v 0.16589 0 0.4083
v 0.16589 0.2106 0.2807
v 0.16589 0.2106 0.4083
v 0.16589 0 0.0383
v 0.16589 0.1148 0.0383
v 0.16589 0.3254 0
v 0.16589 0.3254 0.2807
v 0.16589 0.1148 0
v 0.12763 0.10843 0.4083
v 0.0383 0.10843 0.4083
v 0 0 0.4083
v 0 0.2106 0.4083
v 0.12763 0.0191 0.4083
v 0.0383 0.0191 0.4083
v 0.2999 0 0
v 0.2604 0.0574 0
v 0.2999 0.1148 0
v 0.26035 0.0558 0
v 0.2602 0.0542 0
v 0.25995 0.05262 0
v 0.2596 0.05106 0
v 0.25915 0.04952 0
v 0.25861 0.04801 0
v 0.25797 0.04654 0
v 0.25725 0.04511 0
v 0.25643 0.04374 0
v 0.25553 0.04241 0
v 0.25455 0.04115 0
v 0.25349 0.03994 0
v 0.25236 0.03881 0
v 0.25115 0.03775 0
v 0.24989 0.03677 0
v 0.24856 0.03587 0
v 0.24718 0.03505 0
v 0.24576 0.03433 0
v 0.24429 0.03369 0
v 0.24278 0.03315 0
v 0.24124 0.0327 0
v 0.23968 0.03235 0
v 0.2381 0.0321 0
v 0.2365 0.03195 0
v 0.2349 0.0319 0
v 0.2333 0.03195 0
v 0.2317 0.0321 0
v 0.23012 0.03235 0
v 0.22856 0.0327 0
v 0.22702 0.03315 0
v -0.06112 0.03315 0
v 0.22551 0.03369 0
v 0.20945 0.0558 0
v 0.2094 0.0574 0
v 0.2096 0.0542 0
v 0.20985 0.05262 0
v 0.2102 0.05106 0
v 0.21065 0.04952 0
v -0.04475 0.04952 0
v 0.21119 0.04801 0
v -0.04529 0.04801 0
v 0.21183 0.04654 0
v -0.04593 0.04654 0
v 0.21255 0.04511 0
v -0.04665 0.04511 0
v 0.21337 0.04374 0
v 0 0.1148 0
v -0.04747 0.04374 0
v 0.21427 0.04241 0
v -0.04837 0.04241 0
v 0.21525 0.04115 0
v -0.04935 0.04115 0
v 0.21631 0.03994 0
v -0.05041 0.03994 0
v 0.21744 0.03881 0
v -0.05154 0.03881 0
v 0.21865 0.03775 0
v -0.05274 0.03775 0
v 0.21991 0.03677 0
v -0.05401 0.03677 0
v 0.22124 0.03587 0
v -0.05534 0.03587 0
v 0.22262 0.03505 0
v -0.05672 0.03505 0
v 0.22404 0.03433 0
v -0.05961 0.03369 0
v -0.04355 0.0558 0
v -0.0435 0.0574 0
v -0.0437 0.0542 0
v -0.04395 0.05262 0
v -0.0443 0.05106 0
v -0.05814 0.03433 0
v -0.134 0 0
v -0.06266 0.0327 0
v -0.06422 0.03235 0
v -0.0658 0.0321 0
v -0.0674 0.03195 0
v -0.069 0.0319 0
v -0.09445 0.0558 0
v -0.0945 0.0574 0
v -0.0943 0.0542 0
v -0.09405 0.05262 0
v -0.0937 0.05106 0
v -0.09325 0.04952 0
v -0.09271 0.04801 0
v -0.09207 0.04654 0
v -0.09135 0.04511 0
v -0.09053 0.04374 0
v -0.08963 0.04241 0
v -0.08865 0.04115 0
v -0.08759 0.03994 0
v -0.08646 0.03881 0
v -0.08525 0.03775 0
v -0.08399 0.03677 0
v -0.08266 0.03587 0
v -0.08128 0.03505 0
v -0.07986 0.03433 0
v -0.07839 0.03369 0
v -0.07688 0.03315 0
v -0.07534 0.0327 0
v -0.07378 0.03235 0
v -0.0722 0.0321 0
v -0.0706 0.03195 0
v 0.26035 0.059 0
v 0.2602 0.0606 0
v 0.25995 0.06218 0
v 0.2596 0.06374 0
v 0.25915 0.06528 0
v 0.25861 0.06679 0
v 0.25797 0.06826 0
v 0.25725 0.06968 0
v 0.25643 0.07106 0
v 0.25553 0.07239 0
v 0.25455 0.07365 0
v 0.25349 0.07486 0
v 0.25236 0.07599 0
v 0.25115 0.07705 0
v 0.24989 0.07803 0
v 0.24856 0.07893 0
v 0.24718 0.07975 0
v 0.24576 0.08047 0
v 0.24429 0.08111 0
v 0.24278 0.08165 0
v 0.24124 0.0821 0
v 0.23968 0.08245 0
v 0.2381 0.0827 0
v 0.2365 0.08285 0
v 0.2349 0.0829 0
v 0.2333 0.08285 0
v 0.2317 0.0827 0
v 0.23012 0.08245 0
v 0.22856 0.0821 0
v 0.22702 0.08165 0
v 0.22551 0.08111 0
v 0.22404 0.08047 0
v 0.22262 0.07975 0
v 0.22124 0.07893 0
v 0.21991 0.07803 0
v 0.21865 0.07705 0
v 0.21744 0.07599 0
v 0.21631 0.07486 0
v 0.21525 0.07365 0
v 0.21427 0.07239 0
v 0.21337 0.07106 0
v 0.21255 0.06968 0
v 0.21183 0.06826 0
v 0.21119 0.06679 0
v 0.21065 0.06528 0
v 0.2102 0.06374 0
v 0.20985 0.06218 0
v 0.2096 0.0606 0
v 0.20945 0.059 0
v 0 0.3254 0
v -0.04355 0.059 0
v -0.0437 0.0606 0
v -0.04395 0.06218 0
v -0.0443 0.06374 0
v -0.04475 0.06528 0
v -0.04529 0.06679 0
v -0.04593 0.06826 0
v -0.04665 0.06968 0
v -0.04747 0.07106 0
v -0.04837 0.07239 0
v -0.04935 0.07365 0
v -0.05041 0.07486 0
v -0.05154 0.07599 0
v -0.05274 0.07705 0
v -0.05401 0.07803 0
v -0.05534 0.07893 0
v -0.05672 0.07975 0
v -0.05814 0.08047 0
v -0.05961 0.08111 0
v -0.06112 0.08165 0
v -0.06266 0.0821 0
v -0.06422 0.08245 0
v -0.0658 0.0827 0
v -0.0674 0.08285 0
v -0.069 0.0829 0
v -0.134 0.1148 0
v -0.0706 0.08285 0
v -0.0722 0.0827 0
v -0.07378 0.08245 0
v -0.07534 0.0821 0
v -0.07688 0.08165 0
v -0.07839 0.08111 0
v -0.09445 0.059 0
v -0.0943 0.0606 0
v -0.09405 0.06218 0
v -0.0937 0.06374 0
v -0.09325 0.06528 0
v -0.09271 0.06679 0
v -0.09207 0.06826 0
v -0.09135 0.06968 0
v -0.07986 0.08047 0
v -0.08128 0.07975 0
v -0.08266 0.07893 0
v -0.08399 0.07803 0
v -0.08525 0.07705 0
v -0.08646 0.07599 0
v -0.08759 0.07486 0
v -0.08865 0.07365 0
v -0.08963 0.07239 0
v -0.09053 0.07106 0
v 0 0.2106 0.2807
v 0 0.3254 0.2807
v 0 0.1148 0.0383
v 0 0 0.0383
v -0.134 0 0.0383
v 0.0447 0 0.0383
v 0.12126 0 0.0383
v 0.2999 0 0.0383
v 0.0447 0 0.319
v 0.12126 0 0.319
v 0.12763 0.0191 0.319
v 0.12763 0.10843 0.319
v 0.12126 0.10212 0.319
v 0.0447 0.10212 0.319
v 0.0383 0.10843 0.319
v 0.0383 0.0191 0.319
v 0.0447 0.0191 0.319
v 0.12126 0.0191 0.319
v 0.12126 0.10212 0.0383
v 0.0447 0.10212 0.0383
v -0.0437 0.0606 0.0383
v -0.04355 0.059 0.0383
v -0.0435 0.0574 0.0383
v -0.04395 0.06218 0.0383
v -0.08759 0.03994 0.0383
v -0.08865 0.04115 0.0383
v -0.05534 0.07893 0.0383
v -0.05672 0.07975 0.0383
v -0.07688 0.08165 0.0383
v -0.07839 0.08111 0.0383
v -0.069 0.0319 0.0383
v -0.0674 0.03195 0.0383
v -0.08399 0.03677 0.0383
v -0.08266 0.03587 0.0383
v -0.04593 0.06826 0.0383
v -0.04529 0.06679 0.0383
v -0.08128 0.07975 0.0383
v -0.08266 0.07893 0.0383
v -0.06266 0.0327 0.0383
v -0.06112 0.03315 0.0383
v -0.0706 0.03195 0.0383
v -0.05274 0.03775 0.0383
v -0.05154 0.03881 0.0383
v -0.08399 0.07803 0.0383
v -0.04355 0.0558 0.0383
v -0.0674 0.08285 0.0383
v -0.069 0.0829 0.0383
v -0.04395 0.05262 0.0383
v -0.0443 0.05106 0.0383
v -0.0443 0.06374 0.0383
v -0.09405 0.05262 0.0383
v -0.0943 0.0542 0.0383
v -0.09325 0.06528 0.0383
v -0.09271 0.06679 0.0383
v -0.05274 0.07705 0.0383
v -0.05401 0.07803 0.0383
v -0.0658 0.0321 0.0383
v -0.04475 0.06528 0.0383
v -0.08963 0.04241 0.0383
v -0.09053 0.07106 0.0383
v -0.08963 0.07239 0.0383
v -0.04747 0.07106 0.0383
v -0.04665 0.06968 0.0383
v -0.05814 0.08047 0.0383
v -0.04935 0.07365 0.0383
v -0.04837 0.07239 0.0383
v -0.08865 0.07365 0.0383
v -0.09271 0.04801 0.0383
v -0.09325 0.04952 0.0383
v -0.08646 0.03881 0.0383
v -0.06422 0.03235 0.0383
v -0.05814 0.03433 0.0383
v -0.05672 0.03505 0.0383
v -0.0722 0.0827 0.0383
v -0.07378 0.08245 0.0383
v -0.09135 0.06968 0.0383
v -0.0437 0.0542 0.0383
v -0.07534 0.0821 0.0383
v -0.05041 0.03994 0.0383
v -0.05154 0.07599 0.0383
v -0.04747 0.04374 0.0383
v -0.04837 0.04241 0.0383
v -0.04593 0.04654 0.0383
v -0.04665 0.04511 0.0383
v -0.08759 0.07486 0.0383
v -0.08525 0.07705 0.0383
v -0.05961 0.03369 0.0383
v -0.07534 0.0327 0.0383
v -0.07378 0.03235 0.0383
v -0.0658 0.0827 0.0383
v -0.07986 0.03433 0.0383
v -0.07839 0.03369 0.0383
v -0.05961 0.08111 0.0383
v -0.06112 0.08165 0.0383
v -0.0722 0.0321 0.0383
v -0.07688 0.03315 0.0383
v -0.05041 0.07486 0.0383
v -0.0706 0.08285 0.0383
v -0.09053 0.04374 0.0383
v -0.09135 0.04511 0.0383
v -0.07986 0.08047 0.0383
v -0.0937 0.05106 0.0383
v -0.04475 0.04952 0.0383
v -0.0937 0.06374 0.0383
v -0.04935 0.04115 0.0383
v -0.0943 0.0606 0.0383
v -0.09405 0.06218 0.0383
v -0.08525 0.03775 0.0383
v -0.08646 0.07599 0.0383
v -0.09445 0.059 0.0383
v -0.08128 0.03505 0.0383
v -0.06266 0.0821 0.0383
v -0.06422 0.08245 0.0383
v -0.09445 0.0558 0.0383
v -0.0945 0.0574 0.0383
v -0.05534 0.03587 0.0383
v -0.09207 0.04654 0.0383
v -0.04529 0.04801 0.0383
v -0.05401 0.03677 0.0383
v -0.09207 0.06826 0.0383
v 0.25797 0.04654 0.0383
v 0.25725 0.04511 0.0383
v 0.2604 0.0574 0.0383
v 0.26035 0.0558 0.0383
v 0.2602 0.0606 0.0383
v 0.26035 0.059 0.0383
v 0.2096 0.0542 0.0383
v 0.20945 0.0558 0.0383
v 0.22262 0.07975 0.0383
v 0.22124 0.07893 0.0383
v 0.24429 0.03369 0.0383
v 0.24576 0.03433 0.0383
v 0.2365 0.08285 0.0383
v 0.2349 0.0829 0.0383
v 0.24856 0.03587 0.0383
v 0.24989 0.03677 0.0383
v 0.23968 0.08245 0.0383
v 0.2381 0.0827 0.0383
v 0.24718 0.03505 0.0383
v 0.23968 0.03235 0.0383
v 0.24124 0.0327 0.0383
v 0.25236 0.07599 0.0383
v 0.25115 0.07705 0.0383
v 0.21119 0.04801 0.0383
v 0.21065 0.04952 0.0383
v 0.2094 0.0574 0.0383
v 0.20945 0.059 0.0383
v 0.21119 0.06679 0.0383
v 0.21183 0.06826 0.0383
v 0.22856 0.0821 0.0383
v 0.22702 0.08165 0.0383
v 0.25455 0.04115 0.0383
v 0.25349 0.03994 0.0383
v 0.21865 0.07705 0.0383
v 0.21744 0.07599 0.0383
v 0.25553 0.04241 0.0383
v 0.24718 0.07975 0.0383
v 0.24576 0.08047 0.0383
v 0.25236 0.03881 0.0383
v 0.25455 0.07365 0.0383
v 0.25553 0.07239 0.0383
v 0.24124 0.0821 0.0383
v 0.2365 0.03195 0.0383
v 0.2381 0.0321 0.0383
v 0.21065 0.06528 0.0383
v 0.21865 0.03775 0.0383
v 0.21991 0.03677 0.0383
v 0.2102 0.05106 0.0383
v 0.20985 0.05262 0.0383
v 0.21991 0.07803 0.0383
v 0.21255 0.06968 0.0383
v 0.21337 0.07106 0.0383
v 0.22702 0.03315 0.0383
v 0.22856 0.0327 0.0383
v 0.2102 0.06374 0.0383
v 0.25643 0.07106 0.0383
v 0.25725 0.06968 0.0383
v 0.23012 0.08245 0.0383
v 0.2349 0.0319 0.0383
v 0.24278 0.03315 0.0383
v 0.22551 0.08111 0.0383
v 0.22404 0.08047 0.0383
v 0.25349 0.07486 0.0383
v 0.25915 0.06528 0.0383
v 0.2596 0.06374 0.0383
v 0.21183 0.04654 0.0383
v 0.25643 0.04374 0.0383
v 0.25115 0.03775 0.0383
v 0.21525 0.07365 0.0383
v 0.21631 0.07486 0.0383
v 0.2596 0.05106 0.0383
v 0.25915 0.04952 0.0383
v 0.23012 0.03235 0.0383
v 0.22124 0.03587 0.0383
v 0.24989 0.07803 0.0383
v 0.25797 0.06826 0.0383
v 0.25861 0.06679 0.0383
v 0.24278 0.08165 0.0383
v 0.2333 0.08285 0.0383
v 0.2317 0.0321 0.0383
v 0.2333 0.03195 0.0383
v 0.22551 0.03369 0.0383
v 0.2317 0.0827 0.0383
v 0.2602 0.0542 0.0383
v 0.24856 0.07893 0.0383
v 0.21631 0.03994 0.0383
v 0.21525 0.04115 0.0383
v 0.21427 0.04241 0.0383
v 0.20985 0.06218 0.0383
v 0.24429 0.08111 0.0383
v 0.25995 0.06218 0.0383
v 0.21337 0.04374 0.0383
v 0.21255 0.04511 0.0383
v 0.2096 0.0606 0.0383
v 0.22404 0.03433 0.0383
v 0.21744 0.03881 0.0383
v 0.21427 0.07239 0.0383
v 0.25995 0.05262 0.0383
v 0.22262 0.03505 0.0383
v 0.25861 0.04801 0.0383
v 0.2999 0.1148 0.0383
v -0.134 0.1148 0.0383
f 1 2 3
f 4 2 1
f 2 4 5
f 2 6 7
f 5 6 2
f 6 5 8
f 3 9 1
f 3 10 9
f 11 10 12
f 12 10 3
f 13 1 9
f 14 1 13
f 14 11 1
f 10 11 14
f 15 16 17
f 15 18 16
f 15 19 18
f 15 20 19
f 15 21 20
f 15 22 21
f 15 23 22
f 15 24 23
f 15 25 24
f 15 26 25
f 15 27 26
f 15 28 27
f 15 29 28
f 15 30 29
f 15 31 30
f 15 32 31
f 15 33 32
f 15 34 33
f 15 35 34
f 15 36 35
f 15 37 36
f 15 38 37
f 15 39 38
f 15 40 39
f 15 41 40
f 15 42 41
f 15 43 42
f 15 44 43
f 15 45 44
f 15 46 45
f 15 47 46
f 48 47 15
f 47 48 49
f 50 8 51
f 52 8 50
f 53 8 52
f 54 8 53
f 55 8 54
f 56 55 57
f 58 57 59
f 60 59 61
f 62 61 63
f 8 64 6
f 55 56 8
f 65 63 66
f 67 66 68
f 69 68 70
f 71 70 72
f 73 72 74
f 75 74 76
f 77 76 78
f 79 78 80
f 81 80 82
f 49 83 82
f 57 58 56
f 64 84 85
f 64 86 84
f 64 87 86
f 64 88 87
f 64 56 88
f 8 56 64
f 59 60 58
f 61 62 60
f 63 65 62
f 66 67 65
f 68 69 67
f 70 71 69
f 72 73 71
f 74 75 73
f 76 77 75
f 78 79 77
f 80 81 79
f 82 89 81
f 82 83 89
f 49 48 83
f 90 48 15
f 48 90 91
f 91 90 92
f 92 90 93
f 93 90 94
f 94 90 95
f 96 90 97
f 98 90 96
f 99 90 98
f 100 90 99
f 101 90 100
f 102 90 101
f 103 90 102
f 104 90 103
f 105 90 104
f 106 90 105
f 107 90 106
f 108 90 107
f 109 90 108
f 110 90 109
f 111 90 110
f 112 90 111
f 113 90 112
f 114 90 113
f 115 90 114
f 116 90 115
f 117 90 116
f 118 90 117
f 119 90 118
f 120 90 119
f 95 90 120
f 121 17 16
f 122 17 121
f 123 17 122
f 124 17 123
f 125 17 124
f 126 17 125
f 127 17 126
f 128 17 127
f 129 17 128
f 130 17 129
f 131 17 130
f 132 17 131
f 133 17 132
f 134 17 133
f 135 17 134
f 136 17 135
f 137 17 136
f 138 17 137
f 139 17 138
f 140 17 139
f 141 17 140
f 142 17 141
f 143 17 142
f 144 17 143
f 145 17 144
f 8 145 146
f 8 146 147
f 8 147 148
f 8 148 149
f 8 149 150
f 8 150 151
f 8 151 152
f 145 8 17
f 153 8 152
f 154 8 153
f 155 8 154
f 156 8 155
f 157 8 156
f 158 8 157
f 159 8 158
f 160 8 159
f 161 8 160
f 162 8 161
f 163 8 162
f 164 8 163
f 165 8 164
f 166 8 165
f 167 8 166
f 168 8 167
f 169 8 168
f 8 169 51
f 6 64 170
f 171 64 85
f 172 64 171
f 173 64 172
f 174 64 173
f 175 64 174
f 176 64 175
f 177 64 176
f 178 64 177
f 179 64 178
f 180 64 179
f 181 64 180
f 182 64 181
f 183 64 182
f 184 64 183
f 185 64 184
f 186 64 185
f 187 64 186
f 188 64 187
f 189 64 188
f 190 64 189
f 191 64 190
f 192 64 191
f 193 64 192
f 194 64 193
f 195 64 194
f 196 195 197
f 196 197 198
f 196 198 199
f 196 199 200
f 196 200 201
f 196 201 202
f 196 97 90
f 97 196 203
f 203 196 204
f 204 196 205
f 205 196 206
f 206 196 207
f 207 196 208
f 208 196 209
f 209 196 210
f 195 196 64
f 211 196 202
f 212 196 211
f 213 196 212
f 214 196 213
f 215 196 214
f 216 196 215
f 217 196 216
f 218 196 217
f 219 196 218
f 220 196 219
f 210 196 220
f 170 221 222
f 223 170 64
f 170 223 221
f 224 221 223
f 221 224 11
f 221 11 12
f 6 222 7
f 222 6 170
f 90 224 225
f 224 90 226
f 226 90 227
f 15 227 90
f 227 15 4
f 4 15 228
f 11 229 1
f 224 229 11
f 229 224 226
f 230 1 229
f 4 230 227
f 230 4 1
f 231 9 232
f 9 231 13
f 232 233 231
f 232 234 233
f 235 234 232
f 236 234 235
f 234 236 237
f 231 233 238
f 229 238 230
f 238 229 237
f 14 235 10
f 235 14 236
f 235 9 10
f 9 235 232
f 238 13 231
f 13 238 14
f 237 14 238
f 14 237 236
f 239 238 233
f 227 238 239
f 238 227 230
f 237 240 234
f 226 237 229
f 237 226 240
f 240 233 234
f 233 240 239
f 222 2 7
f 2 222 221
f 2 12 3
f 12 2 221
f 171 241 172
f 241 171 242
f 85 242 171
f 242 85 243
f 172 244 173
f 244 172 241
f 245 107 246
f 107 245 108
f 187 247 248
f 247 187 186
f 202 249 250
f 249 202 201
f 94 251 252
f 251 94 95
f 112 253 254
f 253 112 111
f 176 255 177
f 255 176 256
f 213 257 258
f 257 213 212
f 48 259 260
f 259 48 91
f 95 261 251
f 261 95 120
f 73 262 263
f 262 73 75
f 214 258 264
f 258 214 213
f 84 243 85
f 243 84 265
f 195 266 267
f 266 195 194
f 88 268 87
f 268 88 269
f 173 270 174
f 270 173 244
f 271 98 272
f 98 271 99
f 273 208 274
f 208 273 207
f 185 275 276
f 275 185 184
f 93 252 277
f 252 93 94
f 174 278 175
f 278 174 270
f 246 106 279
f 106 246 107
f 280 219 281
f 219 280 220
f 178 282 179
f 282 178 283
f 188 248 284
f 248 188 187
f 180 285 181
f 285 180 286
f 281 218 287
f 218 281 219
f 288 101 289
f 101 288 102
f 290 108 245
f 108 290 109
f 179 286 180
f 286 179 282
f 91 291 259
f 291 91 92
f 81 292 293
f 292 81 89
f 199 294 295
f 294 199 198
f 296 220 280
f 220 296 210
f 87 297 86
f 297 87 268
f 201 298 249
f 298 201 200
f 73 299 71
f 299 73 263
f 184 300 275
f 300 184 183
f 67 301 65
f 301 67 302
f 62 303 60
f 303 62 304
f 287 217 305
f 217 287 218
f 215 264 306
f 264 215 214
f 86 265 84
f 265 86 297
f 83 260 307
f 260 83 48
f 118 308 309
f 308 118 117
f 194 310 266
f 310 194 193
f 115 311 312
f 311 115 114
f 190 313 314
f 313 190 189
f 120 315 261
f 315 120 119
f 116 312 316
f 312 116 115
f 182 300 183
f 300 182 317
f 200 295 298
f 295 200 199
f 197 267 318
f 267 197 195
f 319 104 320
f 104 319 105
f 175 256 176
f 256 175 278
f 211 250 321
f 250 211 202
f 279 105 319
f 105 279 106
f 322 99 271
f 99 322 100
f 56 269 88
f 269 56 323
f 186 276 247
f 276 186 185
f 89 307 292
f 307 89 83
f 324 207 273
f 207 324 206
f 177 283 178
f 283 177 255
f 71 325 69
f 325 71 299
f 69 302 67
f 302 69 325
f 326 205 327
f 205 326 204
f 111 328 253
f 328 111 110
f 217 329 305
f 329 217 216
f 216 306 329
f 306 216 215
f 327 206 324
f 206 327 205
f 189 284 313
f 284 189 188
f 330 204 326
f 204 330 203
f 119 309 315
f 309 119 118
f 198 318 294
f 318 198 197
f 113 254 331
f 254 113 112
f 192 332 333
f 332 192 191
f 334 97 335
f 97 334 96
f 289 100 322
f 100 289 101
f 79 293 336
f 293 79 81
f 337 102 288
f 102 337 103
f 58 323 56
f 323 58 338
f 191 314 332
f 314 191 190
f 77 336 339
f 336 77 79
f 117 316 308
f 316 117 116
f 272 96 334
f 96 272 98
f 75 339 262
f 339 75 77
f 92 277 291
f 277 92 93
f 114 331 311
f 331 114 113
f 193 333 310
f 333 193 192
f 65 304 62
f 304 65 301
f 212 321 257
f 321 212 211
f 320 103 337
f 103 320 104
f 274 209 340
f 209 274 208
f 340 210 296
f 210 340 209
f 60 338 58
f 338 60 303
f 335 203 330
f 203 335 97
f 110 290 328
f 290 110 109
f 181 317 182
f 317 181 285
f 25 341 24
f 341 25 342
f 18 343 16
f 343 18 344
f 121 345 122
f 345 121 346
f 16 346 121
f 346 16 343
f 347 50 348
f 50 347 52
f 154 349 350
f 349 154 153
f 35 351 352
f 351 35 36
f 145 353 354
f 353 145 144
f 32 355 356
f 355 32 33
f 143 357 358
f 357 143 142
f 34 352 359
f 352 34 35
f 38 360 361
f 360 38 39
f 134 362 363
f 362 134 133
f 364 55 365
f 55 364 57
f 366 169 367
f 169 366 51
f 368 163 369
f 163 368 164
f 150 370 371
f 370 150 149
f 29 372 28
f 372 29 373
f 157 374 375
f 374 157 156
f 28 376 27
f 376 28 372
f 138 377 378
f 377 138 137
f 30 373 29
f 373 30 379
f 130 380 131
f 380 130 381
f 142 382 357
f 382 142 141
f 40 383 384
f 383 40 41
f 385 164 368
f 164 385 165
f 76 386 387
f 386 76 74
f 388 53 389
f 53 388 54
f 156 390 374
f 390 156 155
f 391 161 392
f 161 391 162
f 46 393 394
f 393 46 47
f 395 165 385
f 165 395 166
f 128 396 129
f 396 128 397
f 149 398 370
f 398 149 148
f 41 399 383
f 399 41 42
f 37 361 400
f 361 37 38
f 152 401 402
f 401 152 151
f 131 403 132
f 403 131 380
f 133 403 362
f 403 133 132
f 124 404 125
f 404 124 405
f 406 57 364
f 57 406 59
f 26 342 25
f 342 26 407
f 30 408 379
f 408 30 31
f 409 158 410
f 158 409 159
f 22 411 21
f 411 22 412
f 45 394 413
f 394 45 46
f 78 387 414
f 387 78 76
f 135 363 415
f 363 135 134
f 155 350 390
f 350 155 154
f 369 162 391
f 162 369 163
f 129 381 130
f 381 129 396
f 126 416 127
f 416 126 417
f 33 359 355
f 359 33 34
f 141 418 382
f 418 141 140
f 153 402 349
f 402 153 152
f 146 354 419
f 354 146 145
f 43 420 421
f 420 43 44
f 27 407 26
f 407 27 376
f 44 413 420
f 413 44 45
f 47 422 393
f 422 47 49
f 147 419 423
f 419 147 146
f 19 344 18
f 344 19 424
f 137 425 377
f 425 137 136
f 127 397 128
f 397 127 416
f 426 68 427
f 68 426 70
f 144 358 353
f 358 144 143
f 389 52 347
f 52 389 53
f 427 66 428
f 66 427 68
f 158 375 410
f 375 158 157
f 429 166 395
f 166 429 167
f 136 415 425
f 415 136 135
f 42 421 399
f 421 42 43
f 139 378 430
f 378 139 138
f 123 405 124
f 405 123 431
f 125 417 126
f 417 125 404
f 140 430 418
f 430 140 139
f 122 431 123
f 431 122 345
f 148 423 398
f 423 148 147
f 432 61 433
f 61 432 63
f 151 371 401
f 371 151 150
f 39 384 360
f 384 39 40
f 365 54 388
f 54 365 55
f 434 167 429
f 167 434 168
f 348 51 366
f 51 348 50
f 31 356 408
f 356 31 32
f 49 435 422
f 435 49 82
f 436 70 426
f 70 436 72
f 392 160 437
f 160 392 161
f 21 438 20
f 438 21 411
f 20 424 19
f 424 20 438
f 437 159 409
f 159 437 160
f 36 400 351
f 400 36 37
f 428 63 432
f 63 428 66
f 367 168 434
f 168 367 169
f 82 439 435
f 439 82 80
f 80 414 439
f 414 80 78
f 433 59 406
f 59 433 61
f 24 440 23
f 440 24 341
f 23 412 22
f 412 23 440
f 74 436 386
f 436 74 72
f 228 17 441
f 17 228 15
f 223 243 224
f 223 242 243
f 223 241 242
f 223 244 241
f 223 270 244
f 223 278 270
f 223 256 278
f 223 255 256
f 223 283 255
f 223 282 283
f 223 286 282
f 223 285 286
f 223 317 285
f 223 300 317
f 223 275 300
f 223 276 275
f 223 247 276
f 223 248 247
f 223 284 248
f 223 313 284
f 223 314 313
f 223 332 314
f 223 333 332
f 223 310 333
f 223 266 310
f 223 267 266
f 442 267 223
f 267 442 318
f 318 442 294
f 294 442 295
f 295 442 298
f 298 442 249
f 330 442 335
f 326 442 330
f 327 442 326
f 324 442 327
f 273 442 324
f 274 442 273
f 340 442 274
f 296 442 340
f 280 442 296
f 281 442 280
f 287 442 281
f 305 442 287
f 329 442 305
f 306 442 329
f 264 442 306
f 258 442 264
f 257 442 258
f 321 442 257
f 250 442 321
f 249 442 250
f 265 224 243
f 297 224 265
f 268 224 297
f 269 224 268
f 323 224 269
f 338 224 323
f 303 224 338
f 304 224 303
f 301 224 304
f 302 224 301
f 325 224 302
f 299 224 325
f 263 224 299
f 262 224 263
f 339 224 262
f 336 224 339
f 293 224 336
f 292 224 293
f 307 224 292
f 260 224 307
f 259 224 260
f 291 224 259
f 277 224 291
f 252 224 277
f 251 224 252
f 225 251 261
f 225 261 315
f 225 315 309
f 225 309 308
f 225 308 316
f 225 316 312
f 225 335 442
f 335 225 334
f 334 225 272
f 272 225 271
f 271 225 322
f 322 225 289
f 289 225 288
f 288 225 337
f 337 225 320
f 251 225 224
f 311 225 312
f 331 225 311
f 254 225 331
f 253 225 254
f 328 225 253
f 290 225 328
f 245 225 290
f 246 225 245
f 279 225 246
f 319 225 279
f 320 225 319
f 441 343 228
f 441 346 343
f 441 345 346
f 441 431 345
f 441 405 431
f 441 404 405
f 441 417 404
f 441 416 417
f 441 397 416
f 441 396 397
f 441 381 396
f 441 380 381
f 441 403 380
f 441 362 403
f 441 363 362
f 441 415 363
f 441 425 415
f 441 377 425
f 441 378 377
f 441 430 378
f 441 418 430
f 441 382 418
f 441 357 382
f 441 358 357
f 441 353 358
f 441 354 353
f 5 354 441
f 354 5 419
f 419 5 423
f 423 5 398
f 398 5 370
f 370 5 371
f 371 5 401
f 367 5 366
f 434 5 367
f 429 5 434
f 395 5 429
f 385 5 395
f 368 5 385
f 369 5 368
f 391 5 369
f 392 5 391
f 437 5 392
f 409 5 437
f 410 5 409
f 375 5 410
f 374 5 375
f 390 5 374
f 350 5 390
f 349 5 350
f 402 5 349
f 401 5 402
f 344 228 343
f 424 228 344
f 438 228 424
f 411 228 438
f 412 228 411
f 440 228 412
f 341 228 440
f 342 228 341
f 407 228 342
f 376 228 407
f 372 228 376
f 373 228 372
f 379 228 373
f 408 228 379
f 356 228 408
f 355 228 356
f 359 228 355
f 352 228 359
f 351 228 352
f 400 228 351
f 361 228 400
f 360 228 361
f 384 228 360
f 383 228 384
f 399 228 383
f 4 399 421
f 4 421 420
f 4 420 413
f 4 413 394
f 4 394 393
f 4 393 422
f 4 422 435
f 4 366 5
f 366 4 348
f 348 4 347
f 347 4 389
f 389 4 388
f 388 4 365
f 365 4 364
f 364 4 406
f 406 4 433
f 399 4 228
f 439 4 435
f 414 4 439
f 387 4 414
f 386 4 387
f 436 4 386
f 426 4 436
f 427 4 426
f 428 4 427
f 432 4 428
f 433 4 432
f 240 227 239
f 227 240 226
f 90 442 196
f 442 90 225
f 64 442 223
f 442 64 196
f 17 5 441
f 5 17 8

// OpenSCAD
// === Parameters ===

// Main base
base_length = 0.165891;    // x
base_width  = 0.325401;    // y
base_height = 0.408347;    // z
base_extr   = 0.4083;      // extrusion depth

// Square recess (top cut)
rec_sx = 0.089326;         // x size
rec_sy = 0.089326;         // y size
rec_ox = 0.0383;           // left offset
rec_oy = 0.0191;           // front offset
rec_z0 = 0.319;            // bottom of recess
rec_z1 = 0.4083;           // top of recess

// Lower rectangular opening
lop_sx = 0.076565;         // x size
lop_sy = 0.132416;         // y size
lop_ox = 0.0447;           // left offset
lop_oy = -0.0303;          // front offset (negative = breaks front face)
lop_z0 = 0;                // bottom
lop_z1 = 0.319;            // top

// Upper back strip removal
str_len = 0.165891;        // full length
str_wid = 0.114848;        // strip width
str_y0  = 0.2106;          // front edge of strip (material left in front)
str_z0  = 0.2807;          // bottom of removed band
str_z1  = 0.4083;          // top of removed band

// Shallow added base section
add_h   = 0.0383;          // height
add_sx  = 0.4339;          // x span
add_sy  = 0.1148;          // y span (front portion)
add_pro = 0.134;           // protrusion beyond each side of main base

// Through holes in shallow section
hol_r   = 0.0255;          // radius
hol_oy  = 0.0574;          // front offset (same for both)
hol1_ox = -0.069;          // left offset of hole 1 relative to base left edge
hol2_ox = 0.2349;          // left offset of hole 2 relative to base left edge

$fn = 100;

// === Modules ===

// Main base block
module main_base() {
    cube([base_length, base_width, base_extr]);
}

// Square recess cut from top surface
module square_recess() {
    translate([rec_ox, rec_oy, rec_z0])
        cube([rec_sx, rec_sy, rec_z1 - rec_z0]);
}

// Lower rectangular opening breaking through front face
module lower_opening() {
    translate([lop_ox, lop_oy, lop_z0])
        cube([lop_sx, lop_sy, lop_z1 - lop_z0]);
}

// Upper back strip removal forming step
module back_strip_cut() {
    translate([0, str_y0, str_z0])
        cube([str_len, str_wid, str_z1 - str_z0]);
}

// Shallow base extension with side protrusions
module shallow_section() {
    translate([-add_pro, 0, 0])
        cube([add_sx, add_sy, add_h]);
}

// Two circular through holes in shallow section
module through_holes() {
    translate([hol1_ox, hol_oy, -0.001])
        cylinder(h = add_h + 0.002, r = hol_r);
    translate([hol2_ox, hol_oy, -0.001])
        cylinder(h = add_h + 0.002, r = hol_r);
}

// === Assembly ===

union() {
    // Base with cuts
    difference() {
        main_base();
        square_recess();    // top recess
        lower_opening();    // lower through opening
        back_strip_cut();   // back step removal
    }
    // Shallow added section with holes
    difference() {
        shallow_section();
        through_holes();
    }
}
